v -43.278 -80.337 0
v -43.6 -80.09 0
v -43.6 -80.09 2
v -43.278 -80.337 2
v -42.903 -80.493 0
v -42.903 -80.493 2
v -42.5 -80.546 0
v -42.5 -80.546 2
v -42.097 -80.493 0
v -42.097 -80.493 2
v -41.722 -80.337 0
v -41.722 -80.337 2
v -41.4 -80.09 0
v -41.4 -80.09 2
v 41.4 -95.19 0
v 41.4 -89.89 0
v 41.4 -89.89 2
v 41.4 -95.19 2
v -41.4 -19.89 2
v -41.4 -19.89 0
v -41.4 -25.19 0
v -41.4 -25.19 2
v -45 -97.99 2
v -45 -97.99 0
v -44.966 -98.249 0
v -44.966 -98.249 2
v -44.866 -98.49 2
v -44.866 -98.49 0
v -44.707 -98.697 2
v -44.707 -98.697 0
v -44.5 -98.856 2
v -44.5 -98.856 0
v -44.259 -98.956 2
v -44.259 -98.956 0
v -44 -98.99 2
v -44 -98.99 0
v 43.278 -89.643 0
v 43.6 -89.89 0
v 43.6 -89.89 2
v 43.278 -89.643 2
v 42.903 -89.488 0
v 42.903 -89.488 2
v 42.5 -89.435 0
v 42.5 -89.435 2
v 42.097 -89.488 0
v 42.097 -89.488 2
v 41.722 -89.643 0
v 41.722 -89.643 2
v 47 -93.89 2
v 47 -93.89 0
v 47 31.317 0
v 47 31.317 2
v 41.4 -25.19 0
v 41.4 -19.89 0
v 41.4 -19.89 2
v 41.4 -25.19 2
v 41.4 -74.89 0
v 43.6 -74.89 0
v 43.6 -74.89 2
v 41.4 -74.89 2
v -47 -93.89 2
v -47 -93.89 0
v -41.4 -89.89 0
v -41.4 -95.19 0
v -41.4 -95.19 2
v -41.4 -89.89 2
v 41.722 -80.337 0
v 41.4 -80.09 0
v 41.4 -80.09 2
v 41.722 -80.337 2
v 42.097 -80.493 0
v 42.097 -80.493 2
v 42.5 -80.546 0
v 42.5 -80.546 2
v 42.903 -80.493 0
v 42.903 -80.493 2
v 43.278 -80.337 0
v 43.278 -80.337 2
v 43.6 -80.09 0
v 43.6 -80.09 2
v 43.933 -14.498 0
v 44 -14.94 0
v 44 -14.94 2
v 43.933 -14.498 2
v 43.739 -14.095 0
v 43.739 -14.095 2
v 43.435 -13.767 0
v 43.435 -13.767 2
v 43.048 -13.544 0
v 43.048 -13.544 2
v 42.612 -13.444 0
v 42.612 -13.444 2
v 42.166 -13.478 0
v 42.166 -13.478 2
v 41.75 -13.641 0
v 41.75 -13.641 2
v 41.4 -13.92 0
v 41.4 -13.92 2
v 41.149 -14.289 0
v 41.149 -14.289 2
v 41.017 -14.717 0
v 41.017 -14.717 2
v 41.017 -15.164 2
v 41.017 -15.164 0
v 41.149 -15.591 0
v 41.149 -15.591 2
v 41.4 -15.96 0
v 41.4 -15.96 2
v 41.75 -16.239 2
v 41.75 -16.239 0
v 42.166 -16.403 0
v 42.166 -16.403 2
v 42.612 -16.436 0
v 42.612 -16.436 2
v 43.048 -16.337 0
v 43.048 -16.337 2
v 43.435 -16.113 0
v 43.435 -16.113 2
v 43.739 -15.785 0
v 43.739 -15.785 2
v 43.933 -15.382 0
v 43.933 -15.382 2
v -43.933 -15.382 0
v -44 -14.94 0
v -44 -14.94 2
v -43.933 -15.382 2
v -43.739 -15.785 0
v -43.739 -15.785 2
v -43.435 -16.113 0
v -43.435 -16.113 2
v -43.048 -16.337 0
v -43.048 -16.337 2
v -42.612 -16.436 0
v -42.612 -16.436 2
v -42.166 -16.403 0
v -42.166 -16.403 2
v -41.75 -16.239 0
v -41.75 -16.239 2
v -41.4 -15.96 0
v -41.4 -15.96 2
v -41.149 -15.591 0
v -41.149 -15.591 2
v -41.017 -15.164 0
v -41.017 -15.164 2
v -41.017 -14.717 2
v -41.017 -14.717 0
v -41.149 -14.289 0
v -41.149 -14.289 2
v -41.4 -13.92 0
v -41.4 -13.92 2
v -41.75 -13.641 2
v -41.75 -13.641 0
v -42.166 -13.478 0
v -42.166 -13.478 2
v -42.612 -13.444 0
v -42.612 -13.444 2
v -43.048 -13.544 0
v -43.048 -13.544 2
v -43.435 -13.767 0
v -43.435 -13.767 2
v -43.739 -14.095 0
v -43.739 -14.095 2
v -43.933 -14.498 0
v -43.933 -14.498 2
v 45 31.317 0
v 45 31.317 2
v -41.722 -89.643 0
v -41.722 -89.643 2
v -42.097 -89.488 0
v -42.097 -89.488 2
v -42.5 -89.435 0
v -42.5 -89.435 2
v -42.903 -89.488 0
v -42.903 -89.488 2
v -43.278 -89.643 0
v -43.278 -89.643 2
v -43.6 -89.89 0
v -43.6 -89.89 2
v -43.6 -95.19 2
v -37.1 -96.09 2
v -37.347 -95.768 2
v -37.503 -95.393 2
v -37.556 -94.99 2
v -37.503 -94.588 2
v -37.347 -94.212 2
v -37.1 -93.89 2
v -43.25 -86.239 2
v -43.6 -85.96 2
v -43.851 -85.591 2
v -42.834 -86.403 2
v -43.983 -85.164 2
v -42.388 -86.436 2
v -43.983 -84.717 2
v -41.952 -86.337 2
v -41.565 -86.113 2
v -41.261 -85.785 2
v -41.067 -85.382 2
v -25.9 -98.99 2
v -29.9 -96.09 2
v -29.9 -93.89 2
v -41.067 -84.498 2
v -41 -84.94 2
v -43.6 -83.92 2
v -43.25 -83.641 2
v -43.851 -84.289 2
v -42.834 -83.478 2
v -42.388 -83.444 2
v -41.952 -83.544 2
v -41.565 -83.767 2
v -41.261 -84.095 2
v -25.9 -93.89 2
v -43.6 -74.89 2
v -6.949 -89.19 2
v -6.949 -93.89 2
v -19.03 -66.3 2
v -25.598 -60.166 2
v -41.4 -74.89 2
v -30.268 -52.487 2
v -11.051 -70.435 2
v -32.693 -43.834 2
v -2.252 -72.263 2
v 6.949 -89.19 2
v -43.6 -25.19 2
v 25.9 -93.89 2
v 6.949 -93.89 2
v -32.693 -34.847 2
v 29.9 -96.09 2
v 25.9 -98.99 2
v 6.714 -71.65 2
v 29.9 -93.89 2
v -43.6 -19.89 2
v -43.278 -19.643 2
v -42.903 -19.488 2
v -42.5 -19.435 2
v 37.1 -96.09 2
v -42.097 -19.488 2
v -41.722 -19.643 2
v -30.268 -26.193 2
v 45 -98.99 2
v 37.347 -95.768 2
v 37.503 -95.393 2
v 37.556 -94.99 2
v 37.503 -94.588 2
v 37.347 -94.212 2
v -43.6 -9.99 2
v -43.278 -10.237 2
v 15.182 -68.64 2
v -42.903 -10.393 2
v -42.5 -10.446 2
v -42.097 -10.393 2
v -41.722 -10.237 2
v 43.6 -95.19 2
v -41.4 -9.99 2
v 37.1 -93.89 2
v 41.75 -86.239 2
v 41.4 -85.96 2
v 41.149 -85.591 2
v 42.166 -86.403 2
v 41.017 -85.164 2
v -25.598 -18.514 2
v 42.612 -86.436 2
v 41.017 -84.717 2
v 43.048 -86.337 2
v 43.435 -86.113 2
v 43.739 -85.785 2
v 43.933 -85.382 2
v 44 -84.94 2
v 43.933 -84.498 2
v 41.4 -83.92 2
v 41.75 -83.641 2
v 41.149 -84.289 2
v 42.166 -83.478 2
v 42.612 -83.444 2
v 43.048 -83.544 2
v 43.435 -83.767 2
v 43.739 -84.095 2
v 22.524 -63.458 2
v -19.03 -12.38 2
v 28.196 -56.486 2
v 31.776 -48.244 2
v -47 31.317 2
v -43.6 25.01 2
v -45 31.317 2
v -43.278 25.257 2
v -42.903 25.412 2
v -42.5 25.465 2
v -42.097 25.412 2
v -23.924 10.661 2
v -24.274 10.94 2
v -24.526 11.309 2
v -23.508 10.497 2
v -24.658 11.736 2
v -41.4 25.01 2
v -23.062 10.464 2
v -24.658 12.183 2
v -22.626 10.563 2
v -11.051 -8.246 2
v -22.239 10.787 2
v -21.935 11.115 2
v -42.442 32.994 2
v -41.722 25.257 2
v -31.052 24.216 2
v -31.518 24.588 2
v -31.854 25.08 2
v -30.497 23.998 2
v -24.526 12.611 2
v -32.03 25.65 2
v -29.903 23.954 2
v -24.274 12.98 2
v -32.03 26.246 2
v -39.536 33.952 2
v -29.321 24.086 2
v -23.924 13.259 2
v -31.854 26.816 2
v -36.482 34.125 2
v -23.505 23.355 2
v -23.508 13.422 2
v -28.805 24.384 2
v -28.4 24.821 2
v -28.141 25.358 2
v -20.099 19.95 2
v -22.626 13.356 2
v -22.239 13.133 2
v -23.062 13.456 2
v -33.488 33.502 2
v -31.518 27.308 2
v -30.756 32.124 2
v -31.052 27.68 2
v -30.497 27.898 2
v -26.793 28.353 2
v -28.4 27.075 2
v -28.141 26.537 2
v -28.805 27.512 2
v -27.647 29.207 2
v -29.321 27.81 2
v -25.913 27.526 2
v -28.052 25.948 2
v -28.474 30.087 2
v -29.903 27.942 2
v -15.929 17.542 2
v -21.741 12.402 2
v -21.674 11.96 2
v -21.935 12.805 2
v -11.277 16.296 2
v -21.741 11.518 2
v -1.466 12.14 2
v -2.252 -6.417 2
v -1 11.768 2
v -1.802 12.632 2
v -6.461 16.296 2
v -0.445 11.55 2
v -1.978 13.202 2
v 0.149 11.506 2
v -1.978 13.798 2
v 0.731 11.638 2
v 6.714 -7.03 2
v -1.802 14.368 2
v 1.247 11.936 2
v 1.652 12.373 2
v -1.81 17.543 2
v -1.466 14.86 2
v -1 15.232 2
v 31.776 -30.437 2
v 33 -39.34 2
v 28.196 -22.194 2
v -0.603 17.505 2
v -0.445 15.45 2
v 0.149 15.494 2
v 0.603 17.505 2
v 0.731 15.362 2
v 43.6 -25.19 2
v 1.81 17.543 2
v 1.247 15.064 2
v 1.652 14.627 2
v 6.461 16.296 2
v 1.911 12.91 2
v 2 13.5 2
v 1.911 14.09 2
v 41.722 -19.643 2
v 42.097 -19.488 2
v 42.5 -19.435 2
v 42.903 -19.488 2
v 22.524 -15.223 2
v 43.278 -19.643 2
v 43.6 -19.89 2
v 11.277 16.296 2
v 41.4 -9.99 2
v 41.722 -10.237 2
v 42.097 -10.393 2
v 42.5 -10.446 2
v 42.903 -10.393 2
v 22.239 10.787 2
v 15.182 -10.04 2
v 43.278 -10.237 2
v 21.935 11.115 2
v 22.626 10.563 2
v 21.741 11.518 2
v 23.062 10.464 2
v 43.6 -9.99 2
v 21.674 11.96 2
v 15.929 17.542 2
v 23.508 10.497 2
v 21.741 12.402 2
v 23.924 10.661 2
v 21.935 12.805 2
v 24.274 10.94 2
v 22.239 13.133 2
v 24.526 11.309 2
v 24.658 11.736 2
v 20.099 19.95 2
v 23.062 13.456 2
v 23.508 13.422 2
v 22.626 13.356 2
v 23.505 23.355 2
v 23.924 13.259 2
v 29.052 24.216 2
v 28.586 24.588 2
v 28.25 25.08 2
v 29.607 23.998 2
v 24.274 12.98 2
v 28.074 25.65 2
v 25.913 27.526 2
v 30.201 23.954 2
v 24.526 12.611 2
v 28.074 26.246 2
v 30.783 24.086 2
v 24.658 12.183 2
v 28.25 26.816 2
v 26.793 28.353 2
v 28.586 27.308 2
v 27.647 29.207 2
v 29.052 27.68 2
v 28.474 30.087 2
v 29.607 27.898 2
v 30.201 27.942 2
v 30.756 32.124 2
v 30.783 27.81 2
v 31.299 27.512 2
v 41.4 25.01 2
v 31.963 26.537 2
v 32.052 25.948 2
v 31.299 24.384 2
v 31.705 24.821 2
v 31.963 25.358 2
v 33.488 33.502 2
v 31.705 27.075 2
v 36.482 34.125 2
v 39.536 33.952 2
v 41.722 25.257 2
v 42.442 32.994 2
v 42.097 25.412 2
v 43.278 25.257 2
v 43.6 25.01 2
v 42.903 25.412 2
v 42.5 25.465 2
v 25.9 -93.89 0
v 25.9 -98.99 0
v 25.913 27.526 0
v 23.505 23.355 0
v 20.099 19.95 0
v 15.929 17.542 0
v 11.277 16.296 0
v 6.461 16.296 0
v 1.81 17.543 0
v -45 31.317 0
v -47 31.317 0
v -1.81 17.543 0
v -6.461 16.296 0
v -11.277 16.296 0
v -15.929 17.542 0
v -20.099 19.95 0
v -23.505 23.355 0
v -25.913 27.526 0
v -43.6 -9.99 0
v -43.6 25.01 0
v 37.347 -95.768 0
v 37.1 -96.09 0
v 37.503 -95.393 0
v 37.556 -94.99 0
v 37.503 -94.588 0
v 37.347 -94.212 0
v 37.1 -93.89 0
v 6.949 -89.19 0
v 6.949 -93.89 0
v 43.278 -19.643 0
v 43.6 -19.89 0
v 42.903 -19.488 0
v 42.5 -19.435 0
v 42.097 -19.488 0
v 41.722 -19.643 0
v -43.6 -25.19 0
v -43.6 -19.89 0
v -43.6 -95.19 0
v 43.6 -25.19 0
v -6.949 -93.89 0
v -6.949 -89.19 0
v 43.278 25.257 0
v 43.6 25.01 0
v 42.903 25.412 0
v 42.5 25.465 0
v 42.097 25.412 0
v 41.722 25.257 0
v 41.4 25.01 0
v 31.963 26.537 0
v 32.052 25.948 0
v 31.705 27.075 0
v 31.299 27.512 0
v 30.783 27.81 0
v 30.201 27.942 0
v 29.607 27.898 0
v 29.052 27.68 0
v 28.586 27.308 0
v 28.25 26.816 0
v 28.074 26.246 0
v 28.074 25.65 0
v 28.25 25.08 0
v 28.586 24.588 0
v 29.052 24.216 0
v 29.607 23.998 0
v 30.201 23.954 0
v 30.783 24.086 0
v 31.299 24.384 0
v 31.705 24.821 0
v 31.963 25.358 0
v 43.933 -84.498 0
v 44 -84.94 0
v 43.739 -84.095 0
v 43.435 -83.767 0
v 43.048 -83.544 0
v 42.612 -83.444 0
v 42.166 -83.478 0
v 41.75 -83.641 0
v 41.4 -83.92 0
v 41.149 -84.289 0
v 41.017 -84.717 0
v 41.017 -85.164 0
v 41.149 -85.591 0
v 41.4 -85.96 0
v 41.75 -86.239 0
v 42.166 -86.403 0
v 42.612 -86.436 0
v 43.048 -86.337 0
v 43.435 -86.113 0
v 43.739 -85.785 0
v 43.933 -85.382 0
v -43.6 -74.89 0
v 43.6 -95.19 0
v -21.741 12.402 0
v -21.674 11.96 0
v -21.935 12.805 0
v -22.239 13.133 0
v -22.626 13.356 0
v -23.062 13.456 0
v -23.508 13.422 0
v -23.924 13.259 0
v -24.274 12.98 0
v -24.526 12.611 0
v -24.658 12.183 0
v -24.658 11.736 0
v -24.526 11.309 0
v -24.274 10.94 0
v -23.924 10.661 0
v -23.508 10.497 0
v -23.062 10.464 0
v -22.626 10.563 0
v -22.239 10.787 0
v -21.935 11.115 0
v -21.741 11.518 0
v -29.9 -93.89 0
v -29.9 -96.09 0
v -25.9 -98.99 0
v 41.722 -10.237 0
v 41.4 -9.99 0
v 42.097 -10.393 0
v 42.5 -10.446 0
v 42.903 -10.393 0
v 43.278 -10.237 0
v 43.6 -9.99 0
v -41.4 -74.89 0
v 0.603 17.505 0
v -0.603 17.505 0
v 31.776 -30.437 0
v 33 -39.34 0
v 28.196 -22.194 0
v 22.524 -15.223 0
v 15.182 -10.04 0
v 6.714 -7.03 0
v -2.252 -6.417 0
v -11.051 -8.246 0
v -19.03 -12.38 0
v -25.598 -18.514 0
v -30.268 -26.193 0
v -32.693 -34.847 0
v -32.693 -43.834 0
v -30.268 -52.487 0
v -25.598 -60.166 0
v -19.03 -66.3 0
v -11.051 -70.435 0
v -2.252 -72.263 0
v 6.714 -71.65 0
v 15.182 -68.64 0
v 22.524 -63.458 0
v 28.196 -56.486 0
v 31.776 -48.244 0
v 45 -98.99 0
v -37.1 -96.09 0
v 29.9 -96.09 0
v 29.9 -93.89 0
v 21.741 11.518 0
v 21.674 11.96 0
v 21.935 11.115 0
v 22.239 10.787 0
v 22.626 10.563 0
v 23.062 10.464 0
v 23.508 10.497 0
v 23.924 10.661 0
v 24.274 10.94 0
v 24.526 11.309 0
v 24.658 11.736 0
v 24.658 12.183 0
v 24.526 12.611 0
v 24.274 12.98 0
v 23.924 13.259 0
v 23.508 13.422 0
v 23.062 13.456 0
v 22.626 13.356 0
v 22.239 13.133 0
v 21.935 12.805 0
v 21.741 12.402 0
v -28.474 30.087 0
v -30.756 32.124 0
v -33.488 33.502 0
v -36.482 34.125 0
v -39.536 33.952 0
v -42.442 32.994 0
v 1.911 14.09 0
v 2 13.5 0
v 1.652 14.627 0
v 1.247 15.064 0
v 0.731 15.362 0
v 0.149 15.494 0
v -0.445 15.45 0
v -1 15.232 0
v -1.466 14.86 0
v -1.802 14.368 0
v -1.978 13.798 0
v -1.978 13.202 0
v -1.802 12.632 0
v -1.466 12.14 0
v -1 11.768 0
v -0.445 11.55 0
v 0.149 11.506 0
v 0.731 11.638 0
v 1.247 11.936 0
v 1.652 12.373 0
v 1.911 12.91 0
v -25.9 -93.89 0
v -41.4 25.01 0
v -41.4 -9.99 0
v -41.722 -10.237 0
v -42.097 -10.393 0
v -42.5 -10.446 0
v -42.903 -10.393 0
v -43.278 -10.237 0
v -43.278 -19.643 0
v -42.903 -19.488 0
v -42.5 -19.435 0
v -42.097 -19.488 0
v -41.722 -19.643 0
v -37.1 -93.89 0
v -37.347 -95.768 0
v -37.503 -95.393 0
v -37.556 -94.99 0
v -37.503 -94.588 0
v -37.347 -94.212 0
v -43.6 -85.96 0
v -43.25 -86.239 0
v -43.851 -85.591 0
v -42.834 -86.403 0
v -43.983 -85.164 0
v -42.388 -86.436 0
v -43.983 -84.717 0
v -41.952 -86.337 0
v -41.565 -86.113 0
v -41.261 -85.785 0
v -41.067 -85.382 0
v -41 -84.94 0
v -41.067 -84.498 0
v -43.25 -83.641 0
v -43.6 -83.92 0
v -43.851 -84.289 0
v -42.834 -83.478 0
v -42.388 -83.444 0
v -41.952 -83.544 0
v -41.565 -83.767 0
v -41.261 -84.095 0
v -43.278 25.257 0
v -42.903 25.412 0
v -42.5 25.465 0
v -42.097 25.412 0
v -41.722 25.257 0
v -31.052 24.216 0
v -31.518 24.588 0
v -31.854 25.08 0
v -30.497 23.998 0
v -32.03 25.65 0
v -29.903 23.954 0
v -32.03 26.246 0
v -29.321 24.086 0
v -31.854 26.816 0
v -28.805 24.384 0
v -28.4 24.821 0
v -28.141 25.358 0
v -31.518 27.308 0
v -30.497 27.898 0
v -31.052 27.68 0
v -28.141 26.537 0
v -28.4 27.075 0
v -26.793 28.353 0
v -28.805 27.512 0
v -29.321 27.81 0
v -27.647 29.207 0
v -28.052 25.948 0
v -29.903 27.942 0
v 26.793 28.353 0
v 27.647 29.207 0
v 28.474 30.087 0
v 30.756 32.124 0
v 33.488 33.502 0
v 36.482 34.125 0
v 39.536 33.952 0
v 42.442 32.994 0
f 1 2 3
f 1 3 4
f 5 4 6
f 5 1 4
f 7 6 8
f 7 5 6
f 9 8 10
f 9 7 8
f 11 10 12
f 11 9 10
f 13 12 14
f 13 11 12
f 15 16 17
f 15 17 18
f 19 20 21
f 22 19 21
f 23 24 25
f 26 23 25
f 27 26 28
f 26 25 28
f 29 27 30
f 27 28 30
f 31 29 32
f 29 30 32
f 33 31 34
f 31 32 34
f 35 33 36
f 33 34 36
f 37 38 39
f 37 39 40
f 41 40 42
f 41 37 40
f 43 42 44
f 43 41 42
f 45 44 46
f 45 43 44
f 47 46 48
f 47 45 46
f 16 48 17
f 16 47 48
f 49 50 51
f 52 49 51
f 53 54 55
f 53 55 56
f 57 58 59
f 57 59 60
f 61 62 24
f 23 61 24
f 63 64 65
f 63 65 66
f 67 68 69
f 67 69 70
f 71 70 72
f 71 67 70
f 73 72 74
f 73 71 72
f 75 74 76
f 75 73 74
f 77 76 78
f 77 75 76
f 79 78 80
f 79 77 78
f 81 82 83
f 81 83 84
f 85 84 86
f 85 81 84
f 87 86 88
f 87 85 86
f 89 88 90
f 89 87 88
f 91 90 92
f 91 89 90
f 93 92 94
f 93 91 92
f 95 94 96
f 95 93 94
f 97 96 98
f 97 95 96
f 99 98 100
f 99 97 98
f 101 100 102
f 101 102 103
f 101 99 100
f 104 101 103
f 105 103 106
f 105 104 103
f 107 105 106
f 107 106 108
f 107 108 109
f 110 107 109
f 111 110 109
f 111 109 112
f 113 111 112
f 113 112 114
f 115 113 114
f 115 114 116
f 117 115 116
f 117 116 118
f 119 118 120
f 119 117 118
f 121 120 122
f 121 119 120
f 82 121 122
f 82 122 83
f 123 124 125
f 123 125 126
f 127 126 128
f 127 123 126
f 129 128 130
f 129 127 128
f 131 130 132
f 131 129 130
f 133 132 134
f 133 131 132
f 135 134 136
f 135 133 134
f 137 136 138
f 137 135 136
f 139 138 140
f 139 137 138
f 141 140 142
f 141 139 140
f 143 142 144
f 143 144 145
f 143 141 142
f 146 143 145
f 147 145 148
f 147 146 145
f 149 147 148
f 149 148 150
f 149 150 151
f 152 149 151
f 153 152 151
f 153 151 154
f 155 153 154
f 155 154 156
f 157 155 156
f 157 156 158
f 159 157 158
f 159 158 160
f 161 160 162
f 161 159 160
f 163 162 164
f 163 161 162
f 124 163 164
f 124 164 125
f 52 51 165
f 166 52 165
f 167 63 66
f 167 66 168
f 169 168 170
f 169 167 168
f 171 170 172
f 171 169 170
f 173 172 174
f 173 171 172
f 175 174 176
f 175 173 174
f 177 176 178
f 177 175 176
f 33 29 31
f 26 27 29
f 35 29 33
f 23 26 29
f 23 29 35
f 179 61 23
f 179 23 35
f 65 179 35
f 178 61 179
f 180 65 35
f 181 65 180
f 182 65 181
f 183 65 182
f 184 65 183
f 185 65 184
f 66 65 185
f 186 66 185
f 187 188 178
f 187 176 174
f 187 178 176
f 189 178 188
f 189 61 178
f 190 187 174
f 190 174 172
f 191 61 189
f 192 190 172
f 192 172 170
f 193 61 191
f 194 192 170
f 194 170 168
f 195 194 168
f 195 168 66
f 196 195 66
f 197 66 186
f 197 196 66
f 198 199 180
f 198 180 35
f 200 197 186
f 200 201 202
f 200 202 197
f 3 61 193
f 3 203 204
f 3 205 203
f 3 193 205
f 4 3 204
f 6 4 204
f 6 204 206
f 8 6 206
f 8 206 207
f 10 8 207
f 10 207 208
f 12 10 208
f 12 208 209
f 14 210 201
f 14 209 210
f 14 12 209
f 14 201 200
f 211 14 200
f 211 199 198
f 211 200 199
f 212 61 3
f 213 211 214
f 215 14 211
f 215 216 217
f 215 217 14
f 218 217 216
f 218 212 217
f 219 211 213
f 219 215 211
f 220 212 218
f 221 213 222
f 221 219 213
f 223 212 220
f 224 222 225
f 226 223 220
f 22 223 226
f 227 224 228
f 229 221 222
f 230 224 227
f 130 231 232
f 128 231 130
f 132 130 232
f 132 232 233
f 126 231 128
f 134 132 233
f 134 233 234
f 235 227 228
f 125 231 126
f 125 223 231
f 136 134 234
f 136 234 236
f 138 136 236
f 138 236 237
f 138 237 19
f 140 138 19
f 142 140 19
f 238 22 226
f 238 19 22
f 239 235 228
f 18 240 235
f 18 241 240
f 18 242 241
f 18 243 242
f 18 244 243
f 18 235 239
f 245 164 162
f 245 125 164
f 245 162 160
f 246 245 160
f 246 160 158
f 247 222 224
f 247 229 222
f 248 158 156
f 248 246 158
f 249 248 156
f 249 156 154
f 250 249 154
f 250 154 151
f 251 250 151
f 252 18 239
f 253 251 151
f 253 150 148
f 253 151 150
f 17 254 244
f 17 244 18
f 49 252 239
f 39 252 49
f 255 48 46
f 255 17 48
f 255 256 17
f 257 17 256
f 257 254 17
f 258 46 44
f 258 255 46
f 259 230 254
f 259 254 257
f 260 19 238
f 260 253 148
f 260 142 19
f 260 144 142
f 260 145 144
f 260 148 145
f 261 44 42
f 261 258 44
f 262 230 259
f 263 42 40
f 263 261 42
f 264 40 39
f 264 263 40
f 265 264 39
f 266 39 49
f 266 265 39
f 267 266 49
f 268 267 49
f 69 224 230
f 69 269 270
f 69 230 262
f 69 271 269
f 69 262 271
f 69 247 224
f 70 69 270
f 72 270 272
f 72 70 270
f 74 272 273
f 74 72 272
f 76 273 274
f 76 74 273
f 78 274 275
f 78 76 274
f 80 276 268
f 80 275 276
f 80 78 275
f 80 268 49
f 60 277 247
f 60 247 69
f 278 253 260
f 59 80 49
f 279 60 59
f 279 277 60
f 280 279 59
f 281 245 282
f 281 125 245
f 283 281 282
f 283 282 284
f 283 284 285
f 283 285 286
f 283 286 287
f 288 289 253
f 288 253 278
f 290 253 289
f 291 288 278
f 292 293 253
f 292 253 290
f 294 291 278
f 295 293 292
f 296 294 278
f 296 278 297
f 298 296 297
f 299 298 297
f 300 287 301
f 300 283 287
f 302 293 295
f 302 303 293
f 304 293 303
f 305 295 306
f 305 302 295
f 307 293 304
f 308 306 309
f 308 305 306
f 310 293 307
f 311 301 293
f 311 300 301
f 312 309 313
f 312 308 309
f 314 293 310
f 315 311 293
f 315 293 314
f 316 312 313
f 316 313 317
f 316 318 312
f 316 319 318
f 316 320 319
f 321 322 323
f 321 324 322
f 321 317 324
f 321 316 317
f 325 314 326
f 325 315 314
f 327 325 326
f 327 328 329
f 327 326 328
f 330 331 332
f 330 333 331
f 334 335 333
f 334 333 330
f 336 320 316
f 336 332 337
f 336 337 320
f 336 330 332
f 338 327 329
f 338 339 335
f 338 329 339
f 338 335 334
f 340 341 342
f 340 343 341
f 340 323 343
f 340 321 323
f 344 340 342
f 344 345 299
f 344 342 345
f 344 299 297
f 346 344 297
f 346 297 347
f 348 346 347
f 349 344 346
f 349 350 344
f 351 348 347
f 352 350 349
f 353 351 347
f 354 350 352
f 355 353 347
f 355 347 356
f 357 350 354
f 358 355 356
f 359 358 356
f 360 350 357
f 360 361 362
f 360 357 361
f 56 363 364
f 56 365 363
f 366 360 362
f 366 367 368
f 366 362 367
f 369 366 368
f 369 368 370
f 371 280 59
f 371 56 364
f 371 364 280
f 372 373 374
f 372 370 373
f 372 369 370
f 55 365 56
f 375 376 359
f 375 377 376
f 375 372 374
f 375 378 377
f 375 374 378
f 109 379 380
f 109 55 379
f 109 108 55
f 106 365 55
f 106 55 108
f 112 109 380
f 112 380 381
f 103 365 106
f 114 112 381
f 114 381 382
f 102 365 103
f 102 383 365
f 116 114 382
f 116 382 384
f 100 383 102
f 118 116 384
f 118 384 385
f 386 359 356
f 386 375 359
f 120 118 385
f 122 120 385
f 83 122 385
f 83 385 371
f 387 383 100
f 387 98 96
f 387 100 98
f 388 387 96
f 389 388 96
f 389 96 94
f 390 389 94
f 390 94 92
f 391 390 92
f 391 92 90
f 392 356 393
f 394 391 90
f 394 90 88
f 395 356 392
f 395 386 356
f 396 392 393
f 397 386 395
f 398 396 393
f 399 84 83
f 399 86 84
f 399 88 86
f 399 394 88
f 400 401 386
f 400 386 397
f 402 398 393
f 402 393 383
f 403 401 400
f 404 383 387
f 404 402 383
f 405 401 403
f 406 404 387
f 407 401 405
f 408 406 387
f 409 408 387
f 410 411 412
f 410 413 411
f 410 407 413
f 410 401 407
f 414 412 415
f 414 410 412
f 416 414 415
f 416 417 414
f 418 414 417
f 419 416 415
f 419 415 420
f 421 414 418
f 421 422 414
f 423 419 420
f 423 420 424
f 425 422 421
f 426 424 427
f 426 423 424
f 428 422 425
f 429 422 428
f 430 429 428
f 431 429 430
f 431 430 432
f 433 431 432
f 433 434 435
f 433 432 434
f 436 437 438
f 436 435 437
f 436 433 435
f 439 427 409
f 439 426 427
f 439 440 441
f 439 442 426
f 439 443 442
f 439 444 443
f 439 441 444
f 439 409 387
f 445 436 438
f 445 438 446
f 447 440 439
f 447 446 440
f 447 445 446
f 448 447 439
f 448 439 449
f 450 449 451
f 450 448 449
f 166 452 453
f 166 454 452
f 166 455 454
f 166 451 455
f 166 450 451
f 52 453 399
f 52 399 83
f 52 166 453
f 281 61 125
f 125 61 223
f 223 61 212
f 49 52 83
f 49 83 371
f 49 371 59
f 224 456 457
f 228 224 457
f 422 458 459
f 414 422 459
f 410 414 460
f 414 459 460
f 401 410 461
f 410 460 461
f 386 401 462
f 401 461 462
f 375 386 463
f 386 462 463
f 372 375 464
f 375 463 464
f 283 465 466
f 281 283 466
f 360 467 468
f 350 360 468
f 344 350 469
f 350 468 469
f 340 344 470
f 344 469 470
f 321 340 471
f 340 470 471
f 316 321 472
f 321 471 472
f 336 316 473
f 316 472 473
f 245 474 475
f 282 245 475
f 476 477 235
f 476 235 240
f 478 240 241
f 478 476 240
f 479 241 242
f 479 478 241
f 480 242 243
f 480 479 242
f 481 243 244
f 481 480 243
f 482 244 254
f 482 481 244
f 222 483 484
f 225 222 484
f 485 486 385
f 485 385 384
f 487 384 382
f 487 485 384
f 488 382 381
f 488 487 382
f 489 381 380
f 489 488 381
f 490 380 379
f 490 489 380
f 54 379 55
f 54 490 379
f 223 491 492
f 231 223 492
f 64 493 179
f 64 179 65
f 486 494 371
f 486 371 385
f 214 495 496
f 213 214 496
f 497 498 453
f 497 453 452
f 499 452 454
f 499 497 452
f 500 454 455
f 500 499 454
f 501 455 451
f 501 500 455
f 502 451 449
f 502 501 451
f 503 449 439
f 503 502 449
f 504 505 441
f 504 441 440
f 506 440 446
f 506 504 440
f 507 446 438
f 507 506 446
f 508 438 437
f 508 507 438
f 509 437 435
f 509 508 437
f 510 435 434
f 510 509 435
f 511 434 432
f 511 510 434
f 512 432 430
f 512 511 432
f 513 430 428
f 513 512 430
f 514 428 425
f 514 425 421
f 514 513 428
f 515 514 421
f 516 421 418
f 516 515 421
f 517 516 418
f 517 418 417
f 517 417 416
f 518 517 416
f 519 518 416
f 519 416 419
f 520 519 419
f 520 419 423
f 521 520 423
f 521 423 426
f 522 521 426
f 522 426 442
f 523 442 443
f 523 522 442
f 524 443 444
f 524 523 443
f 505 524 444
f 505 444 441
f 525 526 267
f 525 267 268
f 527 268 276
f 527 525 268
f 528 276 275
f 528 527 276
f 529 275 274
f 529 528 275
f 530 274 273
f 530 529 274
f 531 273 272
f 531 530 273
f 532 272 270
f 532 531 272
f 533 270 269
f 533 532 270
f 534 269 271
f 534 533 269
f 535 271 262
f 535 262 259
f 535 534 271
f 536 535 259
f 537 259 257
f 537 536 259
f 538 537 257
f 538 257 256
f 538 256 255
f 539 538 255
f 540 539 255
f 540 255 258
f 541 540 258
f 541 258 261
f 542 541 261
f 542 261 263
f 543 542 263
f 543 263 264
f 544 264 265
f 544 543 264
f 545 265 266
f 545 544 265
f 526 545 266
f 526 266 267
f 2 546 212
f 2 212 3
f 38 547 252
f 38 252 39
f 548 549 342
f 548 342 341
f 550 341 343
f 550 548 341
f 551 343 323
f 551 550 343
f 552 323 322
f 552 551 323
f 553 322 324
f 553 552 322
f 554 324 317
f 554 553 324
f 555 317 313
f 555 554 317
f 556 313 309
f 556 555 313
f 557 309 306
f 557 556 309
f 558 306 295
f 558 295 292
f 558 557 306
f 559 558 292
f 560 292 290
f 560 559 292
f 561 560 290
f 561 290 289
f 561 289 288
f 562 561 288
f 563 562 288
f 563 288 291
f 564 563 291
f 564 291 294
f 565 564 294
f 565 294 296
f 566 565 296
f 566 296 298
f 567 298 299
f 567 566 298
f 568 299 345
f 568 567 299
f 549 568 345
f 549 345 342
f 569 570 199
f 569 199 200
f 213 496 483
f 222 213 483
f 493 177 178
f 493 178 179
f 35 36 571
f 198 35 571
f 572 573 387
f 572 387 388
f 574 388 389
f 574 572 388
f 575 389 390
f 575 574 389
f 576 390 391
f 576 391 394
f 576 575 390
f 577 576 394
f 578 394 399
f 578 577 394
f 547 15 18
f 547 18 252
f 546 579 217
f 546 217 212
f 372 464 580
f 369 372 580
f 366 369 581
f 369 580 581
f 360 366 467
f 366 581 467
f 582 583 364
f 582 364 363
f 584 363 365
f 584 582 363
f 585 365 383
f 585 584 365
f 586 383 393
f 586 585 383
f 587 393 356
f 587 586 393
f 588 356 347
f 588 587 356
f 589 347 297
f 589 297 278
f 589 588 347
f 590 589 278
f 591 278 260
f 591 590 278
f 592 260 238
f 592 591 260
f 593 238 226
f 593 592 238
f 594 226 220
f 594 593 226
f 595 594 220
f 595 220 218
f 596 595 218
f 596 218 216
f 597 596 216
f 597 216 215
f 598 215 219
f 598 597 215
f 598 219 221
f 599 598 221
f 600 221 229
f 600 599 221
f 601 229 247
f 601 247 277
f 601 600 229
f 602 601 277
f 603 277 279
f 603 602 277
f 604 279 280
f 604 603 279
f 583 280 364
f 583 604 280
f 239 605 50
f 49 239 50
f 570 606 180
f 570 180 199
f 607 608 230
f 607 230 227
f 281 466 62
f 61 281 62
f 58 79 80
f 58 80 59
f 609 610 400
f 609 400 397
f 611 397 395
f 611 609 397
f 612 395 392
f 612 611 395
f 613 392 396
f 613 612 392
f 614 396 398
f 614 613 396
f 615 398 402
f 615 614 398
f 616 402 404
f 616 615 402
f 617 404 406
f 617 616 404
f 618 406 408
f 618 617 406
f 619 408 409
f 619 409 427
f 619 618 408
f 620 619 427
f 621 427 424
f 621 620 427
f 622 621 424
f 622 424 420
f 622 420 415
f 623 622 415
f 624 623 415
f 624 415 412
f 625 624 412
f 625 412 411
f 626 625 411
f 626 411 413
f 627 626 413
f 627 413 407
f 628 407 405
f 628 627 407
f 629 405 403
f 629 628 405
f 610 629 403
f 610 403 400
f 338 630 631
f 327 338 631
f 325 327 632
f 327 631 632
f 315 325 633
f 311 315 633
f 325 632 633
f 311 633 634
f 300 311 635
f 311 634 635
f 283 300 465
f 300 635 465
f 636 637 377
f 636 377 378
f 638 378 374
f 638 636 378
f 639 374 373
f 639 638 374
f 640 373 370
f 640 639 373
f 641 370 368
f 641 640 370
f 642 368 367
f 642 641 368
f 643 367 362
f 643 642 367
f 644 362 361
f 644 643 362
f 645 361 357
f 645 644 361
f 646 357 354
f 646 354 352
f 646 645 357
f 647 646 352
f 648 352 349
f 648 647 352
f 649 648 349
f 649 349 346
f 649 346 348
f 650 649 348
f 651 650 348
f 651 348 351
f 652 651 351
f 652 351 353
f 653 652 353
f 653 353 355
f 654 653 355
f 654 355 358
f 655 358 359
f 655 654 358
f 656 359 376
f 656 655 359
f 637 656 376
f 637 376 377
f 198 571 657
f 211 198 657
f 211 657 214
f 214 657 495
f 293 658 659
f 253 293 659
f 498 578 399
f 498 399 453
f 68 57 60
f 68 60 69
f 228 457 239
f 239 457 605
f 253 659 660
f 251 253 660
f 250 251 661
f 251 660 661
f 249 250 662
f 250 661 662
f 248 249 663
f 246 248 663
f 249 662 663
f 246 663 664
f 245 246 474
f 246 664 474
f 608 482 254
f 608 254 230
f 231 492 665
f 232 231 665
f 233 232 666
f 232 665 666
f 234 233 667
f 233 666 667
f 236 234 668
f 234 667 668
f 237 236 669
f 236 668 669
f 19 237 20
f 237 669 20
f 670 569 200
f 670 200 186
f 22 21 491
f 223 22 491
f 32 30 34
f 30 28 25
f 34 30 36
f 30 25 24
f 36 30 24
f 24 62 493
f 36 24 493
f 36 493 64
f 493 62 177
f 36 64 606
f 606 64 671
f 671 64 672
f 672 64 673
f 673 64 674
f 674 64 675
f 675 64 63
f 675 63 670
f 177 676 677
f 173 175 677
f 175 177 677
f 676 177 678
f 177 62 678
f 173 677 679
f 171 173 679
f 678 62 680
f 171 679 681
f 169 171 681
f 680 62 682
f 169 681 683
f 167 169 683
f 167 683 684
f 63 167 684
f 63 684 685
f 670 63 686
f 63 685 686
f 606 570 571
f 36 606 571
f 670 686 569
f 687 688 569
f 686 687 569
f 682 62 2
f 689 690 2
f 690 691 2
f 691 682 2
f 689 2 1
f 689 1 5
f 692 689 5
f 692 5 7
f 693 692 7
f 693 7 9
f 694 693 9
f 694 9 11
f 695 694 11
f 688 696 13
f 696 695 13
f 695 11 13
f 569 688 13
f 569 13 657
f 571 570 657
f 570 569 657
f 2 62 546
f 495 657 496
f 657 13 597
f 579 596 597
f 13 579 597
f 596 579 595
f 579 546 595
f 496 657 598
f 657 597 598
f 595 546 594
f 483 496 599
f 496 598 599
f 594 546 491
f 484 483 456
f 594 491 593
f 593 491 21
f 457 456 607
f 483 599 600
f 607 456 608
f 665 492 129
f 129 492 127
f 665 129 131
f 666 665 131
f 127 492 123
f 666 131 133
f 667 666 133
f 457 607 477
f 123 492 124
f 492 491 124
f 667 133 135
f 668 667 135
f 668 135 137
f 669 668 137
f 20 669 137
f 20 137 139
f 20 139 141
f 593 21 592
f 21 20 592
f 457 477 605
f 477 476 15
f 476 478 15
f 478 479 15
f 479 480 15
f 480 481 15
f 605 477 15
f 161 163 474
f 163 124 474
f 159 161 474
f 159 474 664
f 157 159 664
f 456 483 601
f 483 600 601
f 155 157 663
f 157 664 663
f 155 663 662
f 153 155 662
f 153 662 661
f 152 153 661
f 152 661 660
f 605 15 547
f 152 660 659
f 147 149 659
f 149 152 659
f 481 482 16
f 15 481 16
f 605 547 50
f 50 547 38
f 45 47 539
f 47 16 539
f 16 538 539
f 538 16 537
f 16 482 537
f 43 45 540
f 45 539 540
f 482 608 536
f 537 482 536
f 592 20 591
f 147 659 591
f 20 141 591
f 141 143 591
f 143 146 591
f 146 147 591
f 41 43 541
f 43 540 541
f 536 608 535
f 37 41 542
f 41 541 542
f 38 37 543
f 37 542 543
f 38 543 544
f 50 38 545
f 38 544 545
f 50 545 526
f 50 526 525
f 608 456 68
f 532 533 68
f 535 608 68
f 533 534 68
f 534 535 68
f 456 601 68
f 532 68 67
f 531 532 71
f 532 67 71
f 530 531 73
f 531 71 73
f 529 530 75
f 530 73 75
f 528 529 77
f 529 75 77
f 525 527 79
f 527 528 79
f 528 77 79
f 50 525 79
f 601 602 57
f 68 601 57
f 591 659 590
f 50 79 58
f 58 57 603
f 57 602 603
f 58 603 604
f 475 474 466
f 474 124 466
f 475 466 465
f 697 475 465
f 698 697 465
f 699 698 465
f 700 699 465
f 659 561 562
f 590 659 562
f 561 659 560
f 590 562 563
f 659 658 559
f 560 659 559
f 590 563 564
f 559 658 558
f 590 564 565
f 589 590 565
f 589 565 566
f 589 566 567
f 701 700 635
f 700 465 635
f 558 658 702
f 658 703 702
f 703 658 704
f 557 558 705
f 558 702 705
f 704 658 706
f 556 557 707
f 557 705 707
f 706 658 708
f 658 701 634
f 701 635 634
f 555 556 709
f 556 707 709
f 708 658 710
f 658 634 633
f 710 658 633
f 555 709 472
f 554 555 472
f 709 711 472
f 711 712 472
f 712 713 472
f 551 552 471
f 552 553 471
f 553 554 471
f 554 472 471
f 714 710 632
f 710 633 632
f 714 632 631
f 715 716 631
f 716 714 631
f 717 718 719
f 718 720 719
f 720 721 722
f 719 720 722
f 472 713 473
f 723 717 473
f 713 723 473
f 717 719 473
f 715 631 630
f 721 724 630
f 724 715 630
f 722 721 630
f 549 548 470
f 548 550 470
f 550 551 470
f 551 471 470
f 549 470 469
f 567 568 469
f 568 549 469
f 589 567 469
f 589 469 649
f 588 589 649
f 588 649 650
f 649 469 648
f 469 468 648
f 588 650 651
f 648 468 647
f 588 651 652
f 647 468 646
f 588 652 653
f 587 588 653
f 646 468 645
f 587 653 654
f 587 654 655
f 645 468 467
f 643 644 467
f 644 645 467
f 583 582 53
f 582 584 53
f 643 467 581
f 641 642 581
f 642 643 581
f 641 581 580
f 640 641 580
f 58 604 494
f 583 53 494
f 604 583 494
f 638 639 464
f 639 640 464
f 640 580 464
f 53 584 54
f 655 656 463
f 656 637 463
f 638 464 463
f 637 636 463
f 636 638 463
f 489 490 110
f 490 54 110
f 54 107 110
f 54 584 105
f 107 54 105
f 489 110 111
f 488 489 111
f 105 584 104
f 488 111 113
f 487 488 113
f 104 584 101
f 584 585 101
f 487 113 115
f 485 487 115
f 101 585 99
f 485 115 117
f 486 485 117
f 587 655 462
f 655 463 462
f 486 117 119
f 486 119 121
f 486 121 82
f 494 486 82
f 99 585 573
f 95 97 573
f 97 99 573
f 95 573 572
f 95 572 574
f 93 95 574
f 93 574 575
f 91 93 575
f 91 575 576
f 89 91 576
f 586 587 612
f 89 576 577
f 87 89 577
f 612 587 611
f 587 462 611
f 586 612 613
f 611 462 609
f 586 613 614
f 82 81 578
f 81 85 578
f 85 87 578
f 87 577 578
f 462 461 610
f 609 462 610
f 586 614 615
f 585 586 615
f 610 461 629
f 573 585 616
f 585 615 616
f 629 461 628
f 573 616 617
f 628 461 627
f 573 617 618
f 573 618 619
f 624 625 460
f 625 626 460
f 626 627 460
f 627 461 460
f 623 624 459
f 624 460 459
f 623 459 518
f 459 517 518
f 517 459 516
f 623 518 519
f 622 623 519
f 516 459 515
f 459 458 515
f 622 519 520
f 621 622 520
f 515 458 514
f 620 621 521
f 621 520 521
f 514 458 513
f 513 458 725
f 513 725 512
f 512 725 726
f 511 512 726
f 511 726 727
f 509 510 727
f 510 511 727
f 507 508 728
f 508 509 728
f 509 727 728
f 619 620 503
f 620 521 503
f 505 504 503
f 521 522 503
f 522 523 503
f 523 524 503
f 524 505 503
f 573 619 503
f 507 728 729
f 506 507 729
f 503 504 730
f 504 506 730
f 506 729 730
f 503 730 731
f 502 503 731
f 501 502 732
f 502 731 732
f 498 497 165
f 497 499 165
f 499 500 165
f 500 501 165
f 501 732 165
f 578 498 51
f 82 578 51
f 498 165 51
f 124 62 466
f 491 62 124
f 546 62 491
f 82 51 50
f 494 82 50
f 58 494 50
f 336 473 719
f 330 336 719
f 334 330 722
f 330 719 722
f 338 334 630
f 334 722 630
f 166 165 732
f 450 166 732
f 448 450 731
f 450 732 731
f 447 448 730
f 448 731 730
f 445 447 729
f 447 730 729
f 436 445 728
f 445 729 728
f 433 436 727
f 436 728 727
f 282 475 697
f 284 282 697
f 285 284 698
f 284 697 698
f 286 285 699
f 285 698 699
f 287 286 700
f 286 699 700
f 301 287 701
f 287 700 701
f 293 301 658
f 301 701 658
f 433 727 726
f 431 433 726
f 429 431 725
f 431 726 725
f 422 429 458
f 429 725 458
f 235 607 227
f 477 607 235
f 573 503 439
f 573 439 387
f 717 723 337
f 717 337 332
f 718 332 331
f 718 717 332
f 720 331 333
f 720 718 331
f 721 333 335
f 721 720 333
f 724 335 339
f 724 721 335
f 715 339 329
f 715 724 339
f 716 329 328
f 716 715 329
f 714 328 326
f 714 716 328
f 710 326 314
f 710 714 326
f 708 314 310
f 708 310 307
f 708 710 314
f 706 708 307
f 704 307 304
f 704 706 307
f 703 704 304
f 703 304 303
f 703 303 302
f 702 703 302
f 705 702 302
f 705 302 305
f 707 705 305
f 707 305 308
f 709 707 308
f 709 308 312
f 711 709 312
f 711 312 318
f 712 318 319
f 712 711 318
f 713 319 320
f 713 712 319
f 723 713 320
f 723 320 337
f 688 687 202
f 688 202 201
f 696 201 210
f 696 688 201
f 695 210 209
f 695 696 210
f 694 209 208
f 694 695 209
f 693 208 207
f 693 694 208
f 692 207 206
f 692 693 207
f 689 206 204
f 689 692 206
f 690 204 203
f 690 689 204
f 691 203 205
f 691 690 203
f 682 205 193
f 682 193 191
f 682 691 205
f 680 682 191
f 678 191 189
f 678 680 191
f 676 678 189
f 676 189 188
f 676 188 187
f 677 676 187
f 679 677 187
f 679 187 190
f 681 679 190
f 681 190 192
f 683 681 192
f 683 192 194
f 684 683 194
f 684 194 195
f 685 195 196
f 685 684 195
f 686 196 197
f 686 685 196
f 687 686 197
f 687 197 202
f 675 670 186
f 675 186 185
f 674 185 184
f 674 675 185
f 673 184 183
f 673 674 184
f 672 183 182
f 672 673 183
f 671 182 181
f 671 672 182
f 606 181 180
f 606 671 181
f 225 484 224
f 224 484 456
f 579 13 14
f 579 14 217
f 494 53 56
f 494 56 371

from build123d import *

# Parameters (mm, degrees)
SKETCH_3_R      = 2
SKETCH_3_R_2    = 1.999999995
SKETCH_3_R_3    = 1.5
SKETCH_3_R_4    = 33
EXTRUDE_1_DEPTH = 2


with BuildPart() as part:
    # 草图3 → 凸台-拉伸1 (new body)
    with BuildSketch(Plane.XY):
        with BuildLine():
            Line((-47, 31.317051182), (-47, -93.890216685))
            Line((-47, -93.890216685), (-45, -97.990216685))
            ThreePointArc((-45, -97.990216685), (-44.707106781, -98.697323466), (-44, -98.990216685))
            Line((-44, -98.990216685), (-25.9, -98.990216685))
            Line((-25.9, -98.990216685), (-25.9, -97.990216685))
            Line((-25.9, -97.990216685), (-25.9, -93.890216685))
            Line((-25.9, -93.890216685), (-15.9, -93.890216685))
            Line((-15.9, -93.890216685), (-6.948981504, -93.890216685))
            Line((-6.948981504, -93.890216685), (-6.948981504, -89.190216685))
            Line((-6.948981504, -89.190216685), (6.948981504, -89.190216685))
            Line((6.948981504, -89.190216685), (6.948981504, -93.890216685))
            Line((6.948981504, -93.890216685), (15.9, -93.890216685))
            Line((15.9, -93.890216685), (25.9, -93.890216685))
            Line((25.9, -93.890216685), (25.9, -97.990216685))
            Line((25.9, -97.990216685), (25.9, -98.990216685))
            Line((25.9, -98.990216685), (45, -98.990216685))
            Line((45, -98.990216685), (47, -93.890216685))
            Line((47, -93.890216685), (47, 31.317051182))
            Line((47, 31.317051182), (45, 31.317051182))
            ThreePointArc((45, 31.317051182), (36.482419799, 34.124770496), (28.474223712, 30.087289143))
            ThreePointArc((28.474223712, 30.087289143), (27.223611076, 28.776388924), (25.912710857, 27.525776288))
            ThreePointArc((25.912710857, 27.525776288), (15.928828372, 17.542283516), (1.809761925, 17.542559084))
            ThreePointArc((1.809761925, 17.542559084), (0, 17.5), (-1.809761925, 17.542559084))
            ThreePointArc((-1.809761925, 17.542559084), (-15.928828372, 17.542283516), (-25.912710857, 27.525776288))
            ThreePointArc((-25.912710857, 27.525776288), (-27.223611076, 28.776388924), (-28.474223712, 30.087289143))
            ThreePointArc((-28.474223712, 30.087289143), (-36.482419799, 34.124770496), (-45, 31.317051182))
            Line((-45, 31.317051182), (-47, 31.317051182))
        make_face()
        with Locations((0, 13.5)):
            Circle(SKETCH_3_R, mode=Mode.SUBTRACT)
        with Locations((-30.052038202, 25.947961669)):
            Circle(SKETCH_3_R_2, mode=Mode.SUBTRACT)
        with Locations((30.052038109, 25.947961893)):
            Circle(SKETCH_3_R_2, mode=Mode.SUBTRACT)
        with Locations((-23.174490752, 11.959783315)):
            Circle(SKETCH_3_R_3, mode=Mode.SUBTRACT)
        with Locations(Location((23.174490752, 11.959783315, 0), (0, 0, 180))):
            Circle(SKETCH_3_R_3, mode=Mode.SUBTRACT)
        with Locations((42.5, -14.940216685)):
            Circle(SKETCH_3_R_3, mode=Mode.SUBTRACT)
        with Locations(Location((-42.5, -14.940216685, 0), (0, 0, 180))):
            Circle(SKETCH_3_R_3, mode=Mode.SUBTRACT)
        with Locations((0, -39.340216685)):
            Circle(SKETCH_3_R_4, mode=Mode.SUBTRACT)
        with Locations((42.5, -84.940216685)):
            Circle(SKETCH_3_R_3, mode=Mode.SUBTRACT)
        with Locations((-42.5, -84.940216685)):
            Circle(SKETCH_3_R_3, mode=Mode.SUBTRACT)
        with BuildLine():
            Line((-37.1, -96.090216685), (-29.9, -96.090216685))
            Line((-29.9, -96.090216685), (-29.9, -93.890216685))
            Line((-29.9, -93.890216685), (-37.1, -93.890216685))
            ThreePointArc((-37.1, -93.890216685), (-37.555634919, -94.990216685), (-37.1, -96.090216685))
        make_face(mode=Mode.SUBTRACT)
        with BuildLine():
            Line((-43.6, -9.990216685), (-43.6, 25.009783315))
            ThreePointArc((-43.6, 25.009783315), (-42.5, 25.465418233), (-41.4, 25.009783315))
            Line((-41.4, 25.009783315), (-41.4, -9.990216685))
            ThreePointArc((-41.4, -9.990216685), (-42.5, -10.445851604), (-43.6, -9.990216685))
        make_face(mode=Mode.SUBTRACT)
        with BuildLine():
            Line((-41.4, -19.890216685), (-41.4, -25.190216685))
            Line((-41.4, -25.190216685), (-43.6, -25.190216685))
            Line((-43.6, -25.190216685), (-43.6, -19.890216685))
            ThreePointArc((-43.6, -19.890216685), (-42.5, -19.434581767), (-41.4, -19.890216685))
        make_face(mode=Mode.SUBTRACT)
        with BuildLine():
            Line((37.1, -93.890216685), (29.9, -93.890216685))
            Line((29.9, -93.890216685), (29.9, -96.090216685))
            Line((29.9, -96.090216685), (37.1, -96.090216685))
            ThreePointArc((37.1, -96.090216685), (37.555634919, -94.990216685), (37.1, -93.890216685))
        make_face(mode=Mode.SUBTRACT)
        with BuildLine():
            Line((43.6, -25.190216685), (43.6, -19.890216685))
            ThreePointArc((43.6, -19.890216685), (42.5, -19.434581767), (41.4, -19.890216685))
            Line((41.4, -19.890216685), (41.4, -25.190216685))
            Line((41.4, -25.190216685), (43.6, -25.190216685))
        make_face(mode=Mode.SUBTRACT)
        with BuildLine():
            Line((43.6, -95.190216685), (43.6, -89.890216685))
            ThreePointArc((43.6, -89.890216685), (42.5, -89.434581767), (41.4, -89.890216685))
            Line((41.4, -89.890216685), (41.4, -95.190216685))
            Line((41.4, -95.190216685), (43.6, -95.190216685))
        make_face(mode=Mode.SUBTRACT)
        with BuildLine():
            Line((41.4, -74.890216685), (41.4, -80.090216685))
            ThreePointArc((41.4, -80.090216685), (42.5, -80.545851604), (43.6, -80.090216685))
            Line((43.6, -80.090216685), (43.6, -74.890216685))
            Line((43.6, -74.890216685), (41.4, -74.890216685))
        make_face(mode=Mode.SUBTRACT)
        with BuildLine():
            Line((-41.4, -95.190216685), (-41.4, -89.890216685))
            ThreePointArc((-41.4, -89.890216685), (-42.5, -89.434581767), (-43.6, -89.890216685))
            Line((-43.6, -89.890216685), (-43.6, -95.190216685))
            Line((-43.6, -95.190216685), (-41.4, -95.190216685))
        make_face(mode=Mode.SUBTRACT)
        with BuildLine():
            Line((-43.6, -74.890216685), (-43.6, -80.090216685))
            ThreePointArc((-43.6, -80.090216685), (-42.5, -80.545851604), (-41.4, -80.090216685))
            Line((-41.4, -80.090216685), (-41.4, -74.890216685))
            Line((-41.4, -74.890216685), (-43.6, -74.890216685))
        make_face(mode=Mode.SUBTRACT)
        with BuildLine():
            Line((41.4, 25.009783315), (41.4, -9.990216685))
            ThreePointArc((41.4, -9.990216685), (42.5, -10.445851604), (43.6, -9.990216685))
            Line((43.6, -9.990216685), (43.6, 25.009783315))
            ThreePointArc((43.6, 25.009783315), (42.5, 25.465418233), (41.4, 25.009783315))
        make_face(mode=Mode.SUBTRACT)
    extrude(amount=EXTRUDE_1_DEPTH)


solid = part.part
